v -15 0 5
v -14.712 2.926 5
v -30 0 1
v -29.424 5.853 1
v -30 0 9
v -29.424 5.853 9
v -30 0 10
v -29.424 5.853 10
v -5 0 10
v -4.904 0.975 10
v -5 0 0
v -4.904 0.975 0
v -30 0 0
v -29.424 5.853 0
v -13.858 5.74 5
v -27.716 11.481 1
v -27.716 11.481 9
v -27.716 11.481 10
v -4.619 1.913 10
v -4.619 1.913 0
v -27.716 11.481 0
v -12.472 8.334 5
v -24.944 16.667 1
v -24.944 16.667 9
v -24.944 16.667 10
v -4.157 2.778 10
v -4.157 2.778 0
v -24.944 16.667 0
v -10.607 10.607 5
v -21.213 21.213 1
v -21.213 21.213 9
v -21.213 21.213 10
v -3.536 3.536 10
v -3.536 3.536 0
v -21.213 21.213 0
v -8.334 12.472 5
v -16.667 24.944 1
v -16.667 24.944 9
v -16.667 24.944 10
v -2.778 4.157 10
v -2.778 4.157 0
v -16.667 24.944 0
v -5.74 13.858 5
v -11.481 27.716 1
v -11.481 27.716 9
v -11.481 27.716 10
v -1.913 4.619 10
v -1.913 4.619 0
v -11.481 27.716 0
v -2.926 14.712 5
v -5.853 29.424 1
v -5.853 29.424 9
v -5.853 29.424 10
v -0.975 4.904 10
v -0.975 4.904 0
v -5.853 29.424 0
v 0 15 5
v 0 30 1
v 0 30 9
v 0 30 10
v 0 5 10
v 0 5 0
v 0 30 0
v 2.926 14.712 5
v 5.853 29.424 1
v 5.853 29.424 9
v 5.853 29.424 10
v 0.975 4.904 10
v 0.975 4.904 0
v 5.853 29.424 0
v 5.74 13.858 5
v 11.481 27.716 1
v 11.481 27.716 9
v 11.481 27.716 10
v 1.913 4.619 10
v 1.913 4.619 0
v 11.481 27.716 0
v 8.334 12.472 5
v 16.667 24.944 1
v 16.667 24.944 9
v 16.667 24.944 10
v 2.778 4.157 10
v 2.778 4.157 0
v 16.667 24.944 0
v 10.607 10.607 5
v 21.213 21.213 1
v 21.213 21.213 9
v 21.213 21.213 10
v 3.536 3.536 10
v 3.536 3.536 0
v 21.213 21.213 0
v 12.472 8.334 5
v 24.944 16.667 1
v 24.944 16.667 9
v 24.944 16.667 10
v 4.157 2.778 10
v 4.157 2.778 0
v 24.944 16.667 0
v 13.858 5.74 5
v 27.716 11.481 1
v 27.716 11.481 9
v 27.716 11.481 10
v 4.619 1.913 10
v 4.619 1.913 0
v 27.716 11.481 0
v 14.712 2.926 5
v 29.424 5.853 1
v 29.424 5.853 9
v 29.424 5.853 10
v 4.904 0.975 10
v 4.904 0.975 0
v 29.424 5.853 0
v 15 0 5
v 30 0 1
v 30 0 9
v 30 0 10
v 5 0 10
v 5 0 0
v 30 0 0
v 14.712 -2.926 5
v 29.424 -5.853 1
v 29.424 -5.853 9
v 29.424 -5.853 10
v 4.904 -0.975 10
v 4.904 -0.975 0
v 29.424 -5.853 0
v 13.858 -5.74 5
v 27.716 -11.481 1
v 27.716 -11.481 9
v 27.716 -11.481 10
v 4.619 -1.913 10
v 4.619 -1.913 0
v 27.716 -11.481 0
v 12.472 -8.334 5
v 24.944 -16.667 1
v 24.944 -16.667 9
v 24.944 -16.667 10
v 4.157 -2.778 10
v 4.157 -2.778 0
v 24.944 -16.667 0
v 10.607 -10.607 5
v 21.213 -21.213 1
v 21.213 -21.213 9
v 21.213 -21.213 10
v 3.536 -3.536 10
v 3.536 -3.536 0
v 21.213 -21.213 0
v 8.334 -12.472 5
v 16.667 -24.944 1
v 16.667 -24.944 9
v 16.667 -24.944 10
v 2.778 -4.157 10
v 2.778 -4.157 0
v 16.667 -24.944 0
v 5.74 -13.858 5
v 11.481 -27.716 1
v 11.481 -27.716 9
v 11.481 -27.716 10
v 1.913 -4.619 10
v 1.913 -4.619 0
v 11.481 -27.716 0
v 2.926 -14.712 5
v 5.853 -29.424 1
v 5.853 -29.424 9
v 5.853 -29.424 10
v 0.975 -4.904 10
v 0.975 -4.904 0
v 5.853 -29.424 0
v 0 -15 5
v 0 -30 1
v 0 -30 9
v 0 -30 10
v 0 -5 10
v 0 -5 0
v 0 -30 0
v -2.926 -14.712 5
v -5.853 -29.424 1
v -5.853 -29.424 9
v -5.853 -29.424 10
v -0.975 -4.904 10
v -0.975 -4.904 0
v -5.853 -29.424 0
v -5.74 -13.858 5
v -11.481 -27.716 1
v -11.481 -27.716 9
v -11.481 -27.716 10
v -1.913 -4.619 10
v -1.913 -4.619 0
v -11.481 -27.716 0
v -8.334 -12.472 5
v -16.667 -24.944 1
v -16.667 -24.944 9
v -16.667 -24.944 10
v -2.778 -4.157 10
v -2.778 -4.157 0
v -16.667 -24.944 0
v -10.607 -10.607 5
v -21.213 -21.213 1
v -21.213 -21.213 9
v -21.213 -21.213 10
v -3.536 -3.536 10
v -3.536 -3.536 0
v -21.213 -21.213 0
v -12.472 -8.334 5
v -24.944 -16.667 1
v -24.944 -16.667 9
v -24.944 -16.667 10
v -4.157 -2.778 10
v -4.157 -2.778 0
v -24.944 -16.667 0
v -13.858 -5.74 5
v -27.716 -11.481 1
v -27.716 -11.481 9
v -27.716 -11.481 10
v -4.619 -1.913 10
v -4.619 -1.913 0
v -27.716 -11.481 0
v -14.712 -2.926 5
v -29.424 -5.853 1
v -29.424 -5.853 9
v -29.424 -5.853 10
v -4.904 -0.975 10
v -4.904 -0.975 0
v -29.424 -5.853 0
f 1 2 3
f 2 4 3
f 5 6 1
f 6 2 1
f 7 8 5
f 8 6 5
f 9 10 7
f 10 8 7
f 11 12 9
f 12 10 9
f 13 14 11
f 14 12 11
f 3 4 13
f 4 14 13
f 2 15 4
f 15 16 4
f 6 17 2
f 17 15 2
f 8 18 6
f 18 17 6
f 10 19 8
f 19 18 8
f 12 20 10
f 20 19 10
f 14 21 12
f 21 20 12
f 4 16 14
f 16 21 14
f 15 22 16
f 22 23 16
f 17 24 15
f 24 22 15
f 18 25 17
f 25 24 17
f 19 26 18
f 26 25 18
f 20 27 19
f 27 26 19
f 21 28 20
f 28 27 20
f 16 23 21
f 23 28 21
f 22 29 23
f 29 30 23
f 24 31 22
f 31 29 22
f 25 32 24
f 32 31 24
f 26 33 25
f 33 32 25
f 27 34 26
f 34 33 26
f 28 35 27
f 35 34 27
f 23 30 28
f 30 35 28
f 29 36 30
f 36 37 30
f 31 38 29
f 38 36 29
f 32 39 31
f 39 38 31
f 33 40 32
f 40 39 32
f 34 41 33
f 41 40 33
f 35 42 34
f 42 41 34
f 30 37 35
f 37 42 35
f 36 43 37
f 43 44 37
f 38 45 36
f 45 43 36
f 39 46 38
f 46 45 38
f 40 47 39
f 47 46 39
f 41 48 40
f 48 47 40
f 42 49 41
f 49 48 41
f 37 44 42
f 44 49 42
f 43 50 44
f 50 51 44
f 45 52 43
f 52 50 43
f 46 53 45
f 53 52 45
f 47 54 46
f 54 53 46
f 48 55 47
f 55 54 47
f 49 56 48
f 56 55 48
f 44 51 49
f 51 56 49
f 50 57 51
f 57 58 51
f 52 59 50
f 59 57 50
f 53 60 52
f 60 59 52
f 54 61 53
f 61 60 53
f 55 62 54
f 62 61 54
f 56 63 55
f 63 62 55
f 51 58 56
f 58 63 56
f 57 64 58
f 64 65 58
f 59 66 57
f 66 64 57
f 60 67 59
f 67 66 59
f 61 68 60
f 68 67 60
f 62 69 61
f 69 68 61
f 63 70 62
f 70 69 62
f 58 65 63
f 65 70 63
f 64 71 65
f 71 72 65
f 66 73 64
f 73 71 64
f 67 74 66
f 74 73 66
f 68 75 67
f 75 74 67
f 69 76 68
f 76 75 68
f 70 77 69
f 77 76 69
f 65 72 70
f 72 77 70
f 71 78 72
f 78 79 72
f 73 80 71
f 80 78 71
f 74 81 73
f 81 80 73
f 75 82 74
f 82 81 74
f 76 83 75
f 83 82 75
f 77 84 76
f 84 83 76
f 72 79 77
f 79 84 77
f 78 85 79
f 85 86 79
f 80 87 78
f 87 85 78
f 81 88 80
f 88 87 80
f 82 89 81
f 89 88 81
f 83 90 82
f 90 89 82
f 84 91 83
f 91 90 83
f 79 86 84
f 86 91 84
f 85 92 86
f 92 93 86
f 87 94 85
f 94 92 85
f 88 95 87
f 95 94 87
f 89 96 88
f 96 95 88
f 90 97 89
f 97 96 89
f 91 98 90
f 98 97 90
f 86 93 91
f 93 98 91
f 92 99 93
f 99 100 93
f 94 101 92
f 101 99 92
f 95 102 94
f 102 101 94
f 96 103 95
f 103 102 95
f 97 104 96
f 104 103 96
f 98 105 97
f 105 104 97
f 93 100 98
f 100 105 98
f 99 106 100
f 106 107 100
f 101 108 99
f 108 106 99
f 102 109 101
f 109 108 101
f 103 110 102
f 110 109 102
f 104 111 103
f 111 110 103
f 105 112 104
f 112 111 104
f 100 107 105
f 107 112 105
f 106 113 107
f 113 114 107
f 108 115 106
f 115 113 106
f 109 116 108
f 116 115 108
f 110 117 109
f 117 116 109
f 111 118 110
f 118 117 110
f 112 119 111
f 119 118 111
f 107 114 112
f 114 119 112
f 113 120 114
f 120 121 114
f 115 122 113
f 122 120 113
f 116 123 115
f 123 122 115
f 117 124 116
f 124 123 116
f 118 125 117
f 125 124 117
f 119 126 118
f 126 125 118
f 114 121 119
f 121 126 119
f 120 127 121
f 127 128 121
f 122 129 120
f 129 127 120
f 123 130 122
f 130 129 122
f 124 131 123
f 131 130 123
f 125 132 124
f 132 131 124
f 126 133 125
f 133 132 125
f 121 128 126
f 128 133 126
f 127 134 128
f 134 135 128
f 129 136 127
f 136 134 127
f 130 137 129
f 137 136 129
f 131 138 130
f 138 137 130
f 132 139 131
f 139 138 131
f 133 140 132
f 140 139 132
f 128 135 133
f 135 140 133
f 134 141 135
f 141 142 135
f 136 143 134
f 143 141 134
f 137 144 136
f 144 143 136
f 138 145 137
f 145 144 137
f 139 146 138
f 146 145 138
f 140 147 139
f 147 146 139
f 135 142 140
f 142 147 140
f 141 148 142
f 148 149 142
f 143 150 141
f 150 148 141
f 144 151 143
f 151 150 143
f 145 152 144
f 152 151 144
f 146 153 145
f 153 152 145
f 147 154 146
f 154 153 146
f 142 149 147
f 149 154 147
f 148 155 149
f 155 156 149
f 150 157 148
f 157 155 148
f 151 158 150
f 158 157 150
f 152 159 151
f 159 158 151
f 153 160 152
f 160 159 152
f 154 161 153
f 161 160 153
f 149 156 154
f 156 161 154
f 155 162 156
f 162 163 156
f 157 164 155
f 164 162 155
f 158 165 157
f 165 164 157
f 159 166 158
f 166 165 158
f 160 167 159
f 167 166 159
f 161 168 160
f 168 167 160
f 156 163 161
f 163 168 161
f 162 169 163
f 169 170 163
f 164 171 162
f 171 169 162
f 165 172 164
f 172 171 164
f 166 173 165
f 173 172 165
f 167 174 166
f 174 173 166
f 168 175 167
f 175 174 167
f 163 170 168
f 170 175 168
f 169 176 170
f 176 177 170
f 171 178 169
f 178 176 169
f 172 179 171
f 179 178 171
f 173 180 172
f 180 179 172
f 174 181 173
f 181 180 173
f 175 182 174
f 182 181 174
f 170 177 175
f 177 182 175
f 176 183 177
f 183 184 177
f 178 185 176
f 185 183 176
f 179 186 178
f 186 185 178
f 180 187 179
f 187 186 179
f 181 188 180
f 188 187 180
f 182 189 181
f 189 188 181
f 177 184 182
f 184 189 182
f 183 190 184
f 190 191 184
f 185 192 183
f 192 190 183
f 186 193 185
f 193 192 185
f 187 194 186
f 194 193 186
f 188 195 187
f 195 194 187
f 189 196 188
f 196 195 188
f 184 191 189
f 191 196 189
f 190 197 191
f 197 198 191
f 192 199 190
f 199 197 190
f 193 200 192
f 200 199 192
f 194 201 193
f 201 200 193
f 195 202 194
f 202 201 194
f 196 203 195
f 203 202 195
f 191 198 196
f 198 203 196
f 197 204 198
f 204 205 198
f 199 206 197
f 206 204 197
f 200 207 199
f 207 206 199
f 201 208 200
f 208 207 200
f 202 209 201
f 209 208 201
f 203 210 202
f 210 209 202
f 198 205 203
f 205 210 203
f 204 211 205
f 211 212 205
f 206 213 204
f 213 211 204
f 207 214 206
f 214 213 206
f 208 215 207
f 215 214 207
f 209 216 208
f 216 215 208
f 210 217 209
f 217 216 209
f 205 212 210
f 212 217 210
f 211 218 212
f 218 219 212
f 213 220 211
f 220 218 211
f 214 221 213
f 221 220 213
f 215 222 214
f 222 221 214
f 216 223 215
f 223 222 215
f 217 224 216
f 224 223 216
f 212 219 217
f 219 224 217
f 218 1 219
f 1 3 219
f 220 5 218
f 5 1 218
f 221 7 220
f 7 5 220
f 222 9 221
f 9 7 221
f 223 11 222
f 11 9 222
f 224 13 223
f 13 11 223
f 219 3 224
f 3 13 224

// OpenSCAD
$fn = 32;

// ----------------------------------------------------------------------
// Revolved part: V-groove pulley R30
// ----------------------------------------------------------------------

// --- parameters (mm) ---
bore_r = 5;               // bore radius
rim_r = 30;               // rim radius
rim_t = 10;               // rim width
groove_r = 15;            // groove root radius
groove_w = 4;             // groove half width
revolve_angle = 360;      // revolve sweep, degrees

bore_d = 2 * bore_r;
rim_d = 2 * rim_r;
groove_d = 2 * groove_r;

profile = [[5, 0], [30, 0], [30, 1], [15, 5], [30, 9], [30, 10], [5, 10]];  // primary outline, 7 points, counter clockwise

// --- the one profile operation ---
rotate_extrude(angle = revolve_angle) polygon(points = profile);
